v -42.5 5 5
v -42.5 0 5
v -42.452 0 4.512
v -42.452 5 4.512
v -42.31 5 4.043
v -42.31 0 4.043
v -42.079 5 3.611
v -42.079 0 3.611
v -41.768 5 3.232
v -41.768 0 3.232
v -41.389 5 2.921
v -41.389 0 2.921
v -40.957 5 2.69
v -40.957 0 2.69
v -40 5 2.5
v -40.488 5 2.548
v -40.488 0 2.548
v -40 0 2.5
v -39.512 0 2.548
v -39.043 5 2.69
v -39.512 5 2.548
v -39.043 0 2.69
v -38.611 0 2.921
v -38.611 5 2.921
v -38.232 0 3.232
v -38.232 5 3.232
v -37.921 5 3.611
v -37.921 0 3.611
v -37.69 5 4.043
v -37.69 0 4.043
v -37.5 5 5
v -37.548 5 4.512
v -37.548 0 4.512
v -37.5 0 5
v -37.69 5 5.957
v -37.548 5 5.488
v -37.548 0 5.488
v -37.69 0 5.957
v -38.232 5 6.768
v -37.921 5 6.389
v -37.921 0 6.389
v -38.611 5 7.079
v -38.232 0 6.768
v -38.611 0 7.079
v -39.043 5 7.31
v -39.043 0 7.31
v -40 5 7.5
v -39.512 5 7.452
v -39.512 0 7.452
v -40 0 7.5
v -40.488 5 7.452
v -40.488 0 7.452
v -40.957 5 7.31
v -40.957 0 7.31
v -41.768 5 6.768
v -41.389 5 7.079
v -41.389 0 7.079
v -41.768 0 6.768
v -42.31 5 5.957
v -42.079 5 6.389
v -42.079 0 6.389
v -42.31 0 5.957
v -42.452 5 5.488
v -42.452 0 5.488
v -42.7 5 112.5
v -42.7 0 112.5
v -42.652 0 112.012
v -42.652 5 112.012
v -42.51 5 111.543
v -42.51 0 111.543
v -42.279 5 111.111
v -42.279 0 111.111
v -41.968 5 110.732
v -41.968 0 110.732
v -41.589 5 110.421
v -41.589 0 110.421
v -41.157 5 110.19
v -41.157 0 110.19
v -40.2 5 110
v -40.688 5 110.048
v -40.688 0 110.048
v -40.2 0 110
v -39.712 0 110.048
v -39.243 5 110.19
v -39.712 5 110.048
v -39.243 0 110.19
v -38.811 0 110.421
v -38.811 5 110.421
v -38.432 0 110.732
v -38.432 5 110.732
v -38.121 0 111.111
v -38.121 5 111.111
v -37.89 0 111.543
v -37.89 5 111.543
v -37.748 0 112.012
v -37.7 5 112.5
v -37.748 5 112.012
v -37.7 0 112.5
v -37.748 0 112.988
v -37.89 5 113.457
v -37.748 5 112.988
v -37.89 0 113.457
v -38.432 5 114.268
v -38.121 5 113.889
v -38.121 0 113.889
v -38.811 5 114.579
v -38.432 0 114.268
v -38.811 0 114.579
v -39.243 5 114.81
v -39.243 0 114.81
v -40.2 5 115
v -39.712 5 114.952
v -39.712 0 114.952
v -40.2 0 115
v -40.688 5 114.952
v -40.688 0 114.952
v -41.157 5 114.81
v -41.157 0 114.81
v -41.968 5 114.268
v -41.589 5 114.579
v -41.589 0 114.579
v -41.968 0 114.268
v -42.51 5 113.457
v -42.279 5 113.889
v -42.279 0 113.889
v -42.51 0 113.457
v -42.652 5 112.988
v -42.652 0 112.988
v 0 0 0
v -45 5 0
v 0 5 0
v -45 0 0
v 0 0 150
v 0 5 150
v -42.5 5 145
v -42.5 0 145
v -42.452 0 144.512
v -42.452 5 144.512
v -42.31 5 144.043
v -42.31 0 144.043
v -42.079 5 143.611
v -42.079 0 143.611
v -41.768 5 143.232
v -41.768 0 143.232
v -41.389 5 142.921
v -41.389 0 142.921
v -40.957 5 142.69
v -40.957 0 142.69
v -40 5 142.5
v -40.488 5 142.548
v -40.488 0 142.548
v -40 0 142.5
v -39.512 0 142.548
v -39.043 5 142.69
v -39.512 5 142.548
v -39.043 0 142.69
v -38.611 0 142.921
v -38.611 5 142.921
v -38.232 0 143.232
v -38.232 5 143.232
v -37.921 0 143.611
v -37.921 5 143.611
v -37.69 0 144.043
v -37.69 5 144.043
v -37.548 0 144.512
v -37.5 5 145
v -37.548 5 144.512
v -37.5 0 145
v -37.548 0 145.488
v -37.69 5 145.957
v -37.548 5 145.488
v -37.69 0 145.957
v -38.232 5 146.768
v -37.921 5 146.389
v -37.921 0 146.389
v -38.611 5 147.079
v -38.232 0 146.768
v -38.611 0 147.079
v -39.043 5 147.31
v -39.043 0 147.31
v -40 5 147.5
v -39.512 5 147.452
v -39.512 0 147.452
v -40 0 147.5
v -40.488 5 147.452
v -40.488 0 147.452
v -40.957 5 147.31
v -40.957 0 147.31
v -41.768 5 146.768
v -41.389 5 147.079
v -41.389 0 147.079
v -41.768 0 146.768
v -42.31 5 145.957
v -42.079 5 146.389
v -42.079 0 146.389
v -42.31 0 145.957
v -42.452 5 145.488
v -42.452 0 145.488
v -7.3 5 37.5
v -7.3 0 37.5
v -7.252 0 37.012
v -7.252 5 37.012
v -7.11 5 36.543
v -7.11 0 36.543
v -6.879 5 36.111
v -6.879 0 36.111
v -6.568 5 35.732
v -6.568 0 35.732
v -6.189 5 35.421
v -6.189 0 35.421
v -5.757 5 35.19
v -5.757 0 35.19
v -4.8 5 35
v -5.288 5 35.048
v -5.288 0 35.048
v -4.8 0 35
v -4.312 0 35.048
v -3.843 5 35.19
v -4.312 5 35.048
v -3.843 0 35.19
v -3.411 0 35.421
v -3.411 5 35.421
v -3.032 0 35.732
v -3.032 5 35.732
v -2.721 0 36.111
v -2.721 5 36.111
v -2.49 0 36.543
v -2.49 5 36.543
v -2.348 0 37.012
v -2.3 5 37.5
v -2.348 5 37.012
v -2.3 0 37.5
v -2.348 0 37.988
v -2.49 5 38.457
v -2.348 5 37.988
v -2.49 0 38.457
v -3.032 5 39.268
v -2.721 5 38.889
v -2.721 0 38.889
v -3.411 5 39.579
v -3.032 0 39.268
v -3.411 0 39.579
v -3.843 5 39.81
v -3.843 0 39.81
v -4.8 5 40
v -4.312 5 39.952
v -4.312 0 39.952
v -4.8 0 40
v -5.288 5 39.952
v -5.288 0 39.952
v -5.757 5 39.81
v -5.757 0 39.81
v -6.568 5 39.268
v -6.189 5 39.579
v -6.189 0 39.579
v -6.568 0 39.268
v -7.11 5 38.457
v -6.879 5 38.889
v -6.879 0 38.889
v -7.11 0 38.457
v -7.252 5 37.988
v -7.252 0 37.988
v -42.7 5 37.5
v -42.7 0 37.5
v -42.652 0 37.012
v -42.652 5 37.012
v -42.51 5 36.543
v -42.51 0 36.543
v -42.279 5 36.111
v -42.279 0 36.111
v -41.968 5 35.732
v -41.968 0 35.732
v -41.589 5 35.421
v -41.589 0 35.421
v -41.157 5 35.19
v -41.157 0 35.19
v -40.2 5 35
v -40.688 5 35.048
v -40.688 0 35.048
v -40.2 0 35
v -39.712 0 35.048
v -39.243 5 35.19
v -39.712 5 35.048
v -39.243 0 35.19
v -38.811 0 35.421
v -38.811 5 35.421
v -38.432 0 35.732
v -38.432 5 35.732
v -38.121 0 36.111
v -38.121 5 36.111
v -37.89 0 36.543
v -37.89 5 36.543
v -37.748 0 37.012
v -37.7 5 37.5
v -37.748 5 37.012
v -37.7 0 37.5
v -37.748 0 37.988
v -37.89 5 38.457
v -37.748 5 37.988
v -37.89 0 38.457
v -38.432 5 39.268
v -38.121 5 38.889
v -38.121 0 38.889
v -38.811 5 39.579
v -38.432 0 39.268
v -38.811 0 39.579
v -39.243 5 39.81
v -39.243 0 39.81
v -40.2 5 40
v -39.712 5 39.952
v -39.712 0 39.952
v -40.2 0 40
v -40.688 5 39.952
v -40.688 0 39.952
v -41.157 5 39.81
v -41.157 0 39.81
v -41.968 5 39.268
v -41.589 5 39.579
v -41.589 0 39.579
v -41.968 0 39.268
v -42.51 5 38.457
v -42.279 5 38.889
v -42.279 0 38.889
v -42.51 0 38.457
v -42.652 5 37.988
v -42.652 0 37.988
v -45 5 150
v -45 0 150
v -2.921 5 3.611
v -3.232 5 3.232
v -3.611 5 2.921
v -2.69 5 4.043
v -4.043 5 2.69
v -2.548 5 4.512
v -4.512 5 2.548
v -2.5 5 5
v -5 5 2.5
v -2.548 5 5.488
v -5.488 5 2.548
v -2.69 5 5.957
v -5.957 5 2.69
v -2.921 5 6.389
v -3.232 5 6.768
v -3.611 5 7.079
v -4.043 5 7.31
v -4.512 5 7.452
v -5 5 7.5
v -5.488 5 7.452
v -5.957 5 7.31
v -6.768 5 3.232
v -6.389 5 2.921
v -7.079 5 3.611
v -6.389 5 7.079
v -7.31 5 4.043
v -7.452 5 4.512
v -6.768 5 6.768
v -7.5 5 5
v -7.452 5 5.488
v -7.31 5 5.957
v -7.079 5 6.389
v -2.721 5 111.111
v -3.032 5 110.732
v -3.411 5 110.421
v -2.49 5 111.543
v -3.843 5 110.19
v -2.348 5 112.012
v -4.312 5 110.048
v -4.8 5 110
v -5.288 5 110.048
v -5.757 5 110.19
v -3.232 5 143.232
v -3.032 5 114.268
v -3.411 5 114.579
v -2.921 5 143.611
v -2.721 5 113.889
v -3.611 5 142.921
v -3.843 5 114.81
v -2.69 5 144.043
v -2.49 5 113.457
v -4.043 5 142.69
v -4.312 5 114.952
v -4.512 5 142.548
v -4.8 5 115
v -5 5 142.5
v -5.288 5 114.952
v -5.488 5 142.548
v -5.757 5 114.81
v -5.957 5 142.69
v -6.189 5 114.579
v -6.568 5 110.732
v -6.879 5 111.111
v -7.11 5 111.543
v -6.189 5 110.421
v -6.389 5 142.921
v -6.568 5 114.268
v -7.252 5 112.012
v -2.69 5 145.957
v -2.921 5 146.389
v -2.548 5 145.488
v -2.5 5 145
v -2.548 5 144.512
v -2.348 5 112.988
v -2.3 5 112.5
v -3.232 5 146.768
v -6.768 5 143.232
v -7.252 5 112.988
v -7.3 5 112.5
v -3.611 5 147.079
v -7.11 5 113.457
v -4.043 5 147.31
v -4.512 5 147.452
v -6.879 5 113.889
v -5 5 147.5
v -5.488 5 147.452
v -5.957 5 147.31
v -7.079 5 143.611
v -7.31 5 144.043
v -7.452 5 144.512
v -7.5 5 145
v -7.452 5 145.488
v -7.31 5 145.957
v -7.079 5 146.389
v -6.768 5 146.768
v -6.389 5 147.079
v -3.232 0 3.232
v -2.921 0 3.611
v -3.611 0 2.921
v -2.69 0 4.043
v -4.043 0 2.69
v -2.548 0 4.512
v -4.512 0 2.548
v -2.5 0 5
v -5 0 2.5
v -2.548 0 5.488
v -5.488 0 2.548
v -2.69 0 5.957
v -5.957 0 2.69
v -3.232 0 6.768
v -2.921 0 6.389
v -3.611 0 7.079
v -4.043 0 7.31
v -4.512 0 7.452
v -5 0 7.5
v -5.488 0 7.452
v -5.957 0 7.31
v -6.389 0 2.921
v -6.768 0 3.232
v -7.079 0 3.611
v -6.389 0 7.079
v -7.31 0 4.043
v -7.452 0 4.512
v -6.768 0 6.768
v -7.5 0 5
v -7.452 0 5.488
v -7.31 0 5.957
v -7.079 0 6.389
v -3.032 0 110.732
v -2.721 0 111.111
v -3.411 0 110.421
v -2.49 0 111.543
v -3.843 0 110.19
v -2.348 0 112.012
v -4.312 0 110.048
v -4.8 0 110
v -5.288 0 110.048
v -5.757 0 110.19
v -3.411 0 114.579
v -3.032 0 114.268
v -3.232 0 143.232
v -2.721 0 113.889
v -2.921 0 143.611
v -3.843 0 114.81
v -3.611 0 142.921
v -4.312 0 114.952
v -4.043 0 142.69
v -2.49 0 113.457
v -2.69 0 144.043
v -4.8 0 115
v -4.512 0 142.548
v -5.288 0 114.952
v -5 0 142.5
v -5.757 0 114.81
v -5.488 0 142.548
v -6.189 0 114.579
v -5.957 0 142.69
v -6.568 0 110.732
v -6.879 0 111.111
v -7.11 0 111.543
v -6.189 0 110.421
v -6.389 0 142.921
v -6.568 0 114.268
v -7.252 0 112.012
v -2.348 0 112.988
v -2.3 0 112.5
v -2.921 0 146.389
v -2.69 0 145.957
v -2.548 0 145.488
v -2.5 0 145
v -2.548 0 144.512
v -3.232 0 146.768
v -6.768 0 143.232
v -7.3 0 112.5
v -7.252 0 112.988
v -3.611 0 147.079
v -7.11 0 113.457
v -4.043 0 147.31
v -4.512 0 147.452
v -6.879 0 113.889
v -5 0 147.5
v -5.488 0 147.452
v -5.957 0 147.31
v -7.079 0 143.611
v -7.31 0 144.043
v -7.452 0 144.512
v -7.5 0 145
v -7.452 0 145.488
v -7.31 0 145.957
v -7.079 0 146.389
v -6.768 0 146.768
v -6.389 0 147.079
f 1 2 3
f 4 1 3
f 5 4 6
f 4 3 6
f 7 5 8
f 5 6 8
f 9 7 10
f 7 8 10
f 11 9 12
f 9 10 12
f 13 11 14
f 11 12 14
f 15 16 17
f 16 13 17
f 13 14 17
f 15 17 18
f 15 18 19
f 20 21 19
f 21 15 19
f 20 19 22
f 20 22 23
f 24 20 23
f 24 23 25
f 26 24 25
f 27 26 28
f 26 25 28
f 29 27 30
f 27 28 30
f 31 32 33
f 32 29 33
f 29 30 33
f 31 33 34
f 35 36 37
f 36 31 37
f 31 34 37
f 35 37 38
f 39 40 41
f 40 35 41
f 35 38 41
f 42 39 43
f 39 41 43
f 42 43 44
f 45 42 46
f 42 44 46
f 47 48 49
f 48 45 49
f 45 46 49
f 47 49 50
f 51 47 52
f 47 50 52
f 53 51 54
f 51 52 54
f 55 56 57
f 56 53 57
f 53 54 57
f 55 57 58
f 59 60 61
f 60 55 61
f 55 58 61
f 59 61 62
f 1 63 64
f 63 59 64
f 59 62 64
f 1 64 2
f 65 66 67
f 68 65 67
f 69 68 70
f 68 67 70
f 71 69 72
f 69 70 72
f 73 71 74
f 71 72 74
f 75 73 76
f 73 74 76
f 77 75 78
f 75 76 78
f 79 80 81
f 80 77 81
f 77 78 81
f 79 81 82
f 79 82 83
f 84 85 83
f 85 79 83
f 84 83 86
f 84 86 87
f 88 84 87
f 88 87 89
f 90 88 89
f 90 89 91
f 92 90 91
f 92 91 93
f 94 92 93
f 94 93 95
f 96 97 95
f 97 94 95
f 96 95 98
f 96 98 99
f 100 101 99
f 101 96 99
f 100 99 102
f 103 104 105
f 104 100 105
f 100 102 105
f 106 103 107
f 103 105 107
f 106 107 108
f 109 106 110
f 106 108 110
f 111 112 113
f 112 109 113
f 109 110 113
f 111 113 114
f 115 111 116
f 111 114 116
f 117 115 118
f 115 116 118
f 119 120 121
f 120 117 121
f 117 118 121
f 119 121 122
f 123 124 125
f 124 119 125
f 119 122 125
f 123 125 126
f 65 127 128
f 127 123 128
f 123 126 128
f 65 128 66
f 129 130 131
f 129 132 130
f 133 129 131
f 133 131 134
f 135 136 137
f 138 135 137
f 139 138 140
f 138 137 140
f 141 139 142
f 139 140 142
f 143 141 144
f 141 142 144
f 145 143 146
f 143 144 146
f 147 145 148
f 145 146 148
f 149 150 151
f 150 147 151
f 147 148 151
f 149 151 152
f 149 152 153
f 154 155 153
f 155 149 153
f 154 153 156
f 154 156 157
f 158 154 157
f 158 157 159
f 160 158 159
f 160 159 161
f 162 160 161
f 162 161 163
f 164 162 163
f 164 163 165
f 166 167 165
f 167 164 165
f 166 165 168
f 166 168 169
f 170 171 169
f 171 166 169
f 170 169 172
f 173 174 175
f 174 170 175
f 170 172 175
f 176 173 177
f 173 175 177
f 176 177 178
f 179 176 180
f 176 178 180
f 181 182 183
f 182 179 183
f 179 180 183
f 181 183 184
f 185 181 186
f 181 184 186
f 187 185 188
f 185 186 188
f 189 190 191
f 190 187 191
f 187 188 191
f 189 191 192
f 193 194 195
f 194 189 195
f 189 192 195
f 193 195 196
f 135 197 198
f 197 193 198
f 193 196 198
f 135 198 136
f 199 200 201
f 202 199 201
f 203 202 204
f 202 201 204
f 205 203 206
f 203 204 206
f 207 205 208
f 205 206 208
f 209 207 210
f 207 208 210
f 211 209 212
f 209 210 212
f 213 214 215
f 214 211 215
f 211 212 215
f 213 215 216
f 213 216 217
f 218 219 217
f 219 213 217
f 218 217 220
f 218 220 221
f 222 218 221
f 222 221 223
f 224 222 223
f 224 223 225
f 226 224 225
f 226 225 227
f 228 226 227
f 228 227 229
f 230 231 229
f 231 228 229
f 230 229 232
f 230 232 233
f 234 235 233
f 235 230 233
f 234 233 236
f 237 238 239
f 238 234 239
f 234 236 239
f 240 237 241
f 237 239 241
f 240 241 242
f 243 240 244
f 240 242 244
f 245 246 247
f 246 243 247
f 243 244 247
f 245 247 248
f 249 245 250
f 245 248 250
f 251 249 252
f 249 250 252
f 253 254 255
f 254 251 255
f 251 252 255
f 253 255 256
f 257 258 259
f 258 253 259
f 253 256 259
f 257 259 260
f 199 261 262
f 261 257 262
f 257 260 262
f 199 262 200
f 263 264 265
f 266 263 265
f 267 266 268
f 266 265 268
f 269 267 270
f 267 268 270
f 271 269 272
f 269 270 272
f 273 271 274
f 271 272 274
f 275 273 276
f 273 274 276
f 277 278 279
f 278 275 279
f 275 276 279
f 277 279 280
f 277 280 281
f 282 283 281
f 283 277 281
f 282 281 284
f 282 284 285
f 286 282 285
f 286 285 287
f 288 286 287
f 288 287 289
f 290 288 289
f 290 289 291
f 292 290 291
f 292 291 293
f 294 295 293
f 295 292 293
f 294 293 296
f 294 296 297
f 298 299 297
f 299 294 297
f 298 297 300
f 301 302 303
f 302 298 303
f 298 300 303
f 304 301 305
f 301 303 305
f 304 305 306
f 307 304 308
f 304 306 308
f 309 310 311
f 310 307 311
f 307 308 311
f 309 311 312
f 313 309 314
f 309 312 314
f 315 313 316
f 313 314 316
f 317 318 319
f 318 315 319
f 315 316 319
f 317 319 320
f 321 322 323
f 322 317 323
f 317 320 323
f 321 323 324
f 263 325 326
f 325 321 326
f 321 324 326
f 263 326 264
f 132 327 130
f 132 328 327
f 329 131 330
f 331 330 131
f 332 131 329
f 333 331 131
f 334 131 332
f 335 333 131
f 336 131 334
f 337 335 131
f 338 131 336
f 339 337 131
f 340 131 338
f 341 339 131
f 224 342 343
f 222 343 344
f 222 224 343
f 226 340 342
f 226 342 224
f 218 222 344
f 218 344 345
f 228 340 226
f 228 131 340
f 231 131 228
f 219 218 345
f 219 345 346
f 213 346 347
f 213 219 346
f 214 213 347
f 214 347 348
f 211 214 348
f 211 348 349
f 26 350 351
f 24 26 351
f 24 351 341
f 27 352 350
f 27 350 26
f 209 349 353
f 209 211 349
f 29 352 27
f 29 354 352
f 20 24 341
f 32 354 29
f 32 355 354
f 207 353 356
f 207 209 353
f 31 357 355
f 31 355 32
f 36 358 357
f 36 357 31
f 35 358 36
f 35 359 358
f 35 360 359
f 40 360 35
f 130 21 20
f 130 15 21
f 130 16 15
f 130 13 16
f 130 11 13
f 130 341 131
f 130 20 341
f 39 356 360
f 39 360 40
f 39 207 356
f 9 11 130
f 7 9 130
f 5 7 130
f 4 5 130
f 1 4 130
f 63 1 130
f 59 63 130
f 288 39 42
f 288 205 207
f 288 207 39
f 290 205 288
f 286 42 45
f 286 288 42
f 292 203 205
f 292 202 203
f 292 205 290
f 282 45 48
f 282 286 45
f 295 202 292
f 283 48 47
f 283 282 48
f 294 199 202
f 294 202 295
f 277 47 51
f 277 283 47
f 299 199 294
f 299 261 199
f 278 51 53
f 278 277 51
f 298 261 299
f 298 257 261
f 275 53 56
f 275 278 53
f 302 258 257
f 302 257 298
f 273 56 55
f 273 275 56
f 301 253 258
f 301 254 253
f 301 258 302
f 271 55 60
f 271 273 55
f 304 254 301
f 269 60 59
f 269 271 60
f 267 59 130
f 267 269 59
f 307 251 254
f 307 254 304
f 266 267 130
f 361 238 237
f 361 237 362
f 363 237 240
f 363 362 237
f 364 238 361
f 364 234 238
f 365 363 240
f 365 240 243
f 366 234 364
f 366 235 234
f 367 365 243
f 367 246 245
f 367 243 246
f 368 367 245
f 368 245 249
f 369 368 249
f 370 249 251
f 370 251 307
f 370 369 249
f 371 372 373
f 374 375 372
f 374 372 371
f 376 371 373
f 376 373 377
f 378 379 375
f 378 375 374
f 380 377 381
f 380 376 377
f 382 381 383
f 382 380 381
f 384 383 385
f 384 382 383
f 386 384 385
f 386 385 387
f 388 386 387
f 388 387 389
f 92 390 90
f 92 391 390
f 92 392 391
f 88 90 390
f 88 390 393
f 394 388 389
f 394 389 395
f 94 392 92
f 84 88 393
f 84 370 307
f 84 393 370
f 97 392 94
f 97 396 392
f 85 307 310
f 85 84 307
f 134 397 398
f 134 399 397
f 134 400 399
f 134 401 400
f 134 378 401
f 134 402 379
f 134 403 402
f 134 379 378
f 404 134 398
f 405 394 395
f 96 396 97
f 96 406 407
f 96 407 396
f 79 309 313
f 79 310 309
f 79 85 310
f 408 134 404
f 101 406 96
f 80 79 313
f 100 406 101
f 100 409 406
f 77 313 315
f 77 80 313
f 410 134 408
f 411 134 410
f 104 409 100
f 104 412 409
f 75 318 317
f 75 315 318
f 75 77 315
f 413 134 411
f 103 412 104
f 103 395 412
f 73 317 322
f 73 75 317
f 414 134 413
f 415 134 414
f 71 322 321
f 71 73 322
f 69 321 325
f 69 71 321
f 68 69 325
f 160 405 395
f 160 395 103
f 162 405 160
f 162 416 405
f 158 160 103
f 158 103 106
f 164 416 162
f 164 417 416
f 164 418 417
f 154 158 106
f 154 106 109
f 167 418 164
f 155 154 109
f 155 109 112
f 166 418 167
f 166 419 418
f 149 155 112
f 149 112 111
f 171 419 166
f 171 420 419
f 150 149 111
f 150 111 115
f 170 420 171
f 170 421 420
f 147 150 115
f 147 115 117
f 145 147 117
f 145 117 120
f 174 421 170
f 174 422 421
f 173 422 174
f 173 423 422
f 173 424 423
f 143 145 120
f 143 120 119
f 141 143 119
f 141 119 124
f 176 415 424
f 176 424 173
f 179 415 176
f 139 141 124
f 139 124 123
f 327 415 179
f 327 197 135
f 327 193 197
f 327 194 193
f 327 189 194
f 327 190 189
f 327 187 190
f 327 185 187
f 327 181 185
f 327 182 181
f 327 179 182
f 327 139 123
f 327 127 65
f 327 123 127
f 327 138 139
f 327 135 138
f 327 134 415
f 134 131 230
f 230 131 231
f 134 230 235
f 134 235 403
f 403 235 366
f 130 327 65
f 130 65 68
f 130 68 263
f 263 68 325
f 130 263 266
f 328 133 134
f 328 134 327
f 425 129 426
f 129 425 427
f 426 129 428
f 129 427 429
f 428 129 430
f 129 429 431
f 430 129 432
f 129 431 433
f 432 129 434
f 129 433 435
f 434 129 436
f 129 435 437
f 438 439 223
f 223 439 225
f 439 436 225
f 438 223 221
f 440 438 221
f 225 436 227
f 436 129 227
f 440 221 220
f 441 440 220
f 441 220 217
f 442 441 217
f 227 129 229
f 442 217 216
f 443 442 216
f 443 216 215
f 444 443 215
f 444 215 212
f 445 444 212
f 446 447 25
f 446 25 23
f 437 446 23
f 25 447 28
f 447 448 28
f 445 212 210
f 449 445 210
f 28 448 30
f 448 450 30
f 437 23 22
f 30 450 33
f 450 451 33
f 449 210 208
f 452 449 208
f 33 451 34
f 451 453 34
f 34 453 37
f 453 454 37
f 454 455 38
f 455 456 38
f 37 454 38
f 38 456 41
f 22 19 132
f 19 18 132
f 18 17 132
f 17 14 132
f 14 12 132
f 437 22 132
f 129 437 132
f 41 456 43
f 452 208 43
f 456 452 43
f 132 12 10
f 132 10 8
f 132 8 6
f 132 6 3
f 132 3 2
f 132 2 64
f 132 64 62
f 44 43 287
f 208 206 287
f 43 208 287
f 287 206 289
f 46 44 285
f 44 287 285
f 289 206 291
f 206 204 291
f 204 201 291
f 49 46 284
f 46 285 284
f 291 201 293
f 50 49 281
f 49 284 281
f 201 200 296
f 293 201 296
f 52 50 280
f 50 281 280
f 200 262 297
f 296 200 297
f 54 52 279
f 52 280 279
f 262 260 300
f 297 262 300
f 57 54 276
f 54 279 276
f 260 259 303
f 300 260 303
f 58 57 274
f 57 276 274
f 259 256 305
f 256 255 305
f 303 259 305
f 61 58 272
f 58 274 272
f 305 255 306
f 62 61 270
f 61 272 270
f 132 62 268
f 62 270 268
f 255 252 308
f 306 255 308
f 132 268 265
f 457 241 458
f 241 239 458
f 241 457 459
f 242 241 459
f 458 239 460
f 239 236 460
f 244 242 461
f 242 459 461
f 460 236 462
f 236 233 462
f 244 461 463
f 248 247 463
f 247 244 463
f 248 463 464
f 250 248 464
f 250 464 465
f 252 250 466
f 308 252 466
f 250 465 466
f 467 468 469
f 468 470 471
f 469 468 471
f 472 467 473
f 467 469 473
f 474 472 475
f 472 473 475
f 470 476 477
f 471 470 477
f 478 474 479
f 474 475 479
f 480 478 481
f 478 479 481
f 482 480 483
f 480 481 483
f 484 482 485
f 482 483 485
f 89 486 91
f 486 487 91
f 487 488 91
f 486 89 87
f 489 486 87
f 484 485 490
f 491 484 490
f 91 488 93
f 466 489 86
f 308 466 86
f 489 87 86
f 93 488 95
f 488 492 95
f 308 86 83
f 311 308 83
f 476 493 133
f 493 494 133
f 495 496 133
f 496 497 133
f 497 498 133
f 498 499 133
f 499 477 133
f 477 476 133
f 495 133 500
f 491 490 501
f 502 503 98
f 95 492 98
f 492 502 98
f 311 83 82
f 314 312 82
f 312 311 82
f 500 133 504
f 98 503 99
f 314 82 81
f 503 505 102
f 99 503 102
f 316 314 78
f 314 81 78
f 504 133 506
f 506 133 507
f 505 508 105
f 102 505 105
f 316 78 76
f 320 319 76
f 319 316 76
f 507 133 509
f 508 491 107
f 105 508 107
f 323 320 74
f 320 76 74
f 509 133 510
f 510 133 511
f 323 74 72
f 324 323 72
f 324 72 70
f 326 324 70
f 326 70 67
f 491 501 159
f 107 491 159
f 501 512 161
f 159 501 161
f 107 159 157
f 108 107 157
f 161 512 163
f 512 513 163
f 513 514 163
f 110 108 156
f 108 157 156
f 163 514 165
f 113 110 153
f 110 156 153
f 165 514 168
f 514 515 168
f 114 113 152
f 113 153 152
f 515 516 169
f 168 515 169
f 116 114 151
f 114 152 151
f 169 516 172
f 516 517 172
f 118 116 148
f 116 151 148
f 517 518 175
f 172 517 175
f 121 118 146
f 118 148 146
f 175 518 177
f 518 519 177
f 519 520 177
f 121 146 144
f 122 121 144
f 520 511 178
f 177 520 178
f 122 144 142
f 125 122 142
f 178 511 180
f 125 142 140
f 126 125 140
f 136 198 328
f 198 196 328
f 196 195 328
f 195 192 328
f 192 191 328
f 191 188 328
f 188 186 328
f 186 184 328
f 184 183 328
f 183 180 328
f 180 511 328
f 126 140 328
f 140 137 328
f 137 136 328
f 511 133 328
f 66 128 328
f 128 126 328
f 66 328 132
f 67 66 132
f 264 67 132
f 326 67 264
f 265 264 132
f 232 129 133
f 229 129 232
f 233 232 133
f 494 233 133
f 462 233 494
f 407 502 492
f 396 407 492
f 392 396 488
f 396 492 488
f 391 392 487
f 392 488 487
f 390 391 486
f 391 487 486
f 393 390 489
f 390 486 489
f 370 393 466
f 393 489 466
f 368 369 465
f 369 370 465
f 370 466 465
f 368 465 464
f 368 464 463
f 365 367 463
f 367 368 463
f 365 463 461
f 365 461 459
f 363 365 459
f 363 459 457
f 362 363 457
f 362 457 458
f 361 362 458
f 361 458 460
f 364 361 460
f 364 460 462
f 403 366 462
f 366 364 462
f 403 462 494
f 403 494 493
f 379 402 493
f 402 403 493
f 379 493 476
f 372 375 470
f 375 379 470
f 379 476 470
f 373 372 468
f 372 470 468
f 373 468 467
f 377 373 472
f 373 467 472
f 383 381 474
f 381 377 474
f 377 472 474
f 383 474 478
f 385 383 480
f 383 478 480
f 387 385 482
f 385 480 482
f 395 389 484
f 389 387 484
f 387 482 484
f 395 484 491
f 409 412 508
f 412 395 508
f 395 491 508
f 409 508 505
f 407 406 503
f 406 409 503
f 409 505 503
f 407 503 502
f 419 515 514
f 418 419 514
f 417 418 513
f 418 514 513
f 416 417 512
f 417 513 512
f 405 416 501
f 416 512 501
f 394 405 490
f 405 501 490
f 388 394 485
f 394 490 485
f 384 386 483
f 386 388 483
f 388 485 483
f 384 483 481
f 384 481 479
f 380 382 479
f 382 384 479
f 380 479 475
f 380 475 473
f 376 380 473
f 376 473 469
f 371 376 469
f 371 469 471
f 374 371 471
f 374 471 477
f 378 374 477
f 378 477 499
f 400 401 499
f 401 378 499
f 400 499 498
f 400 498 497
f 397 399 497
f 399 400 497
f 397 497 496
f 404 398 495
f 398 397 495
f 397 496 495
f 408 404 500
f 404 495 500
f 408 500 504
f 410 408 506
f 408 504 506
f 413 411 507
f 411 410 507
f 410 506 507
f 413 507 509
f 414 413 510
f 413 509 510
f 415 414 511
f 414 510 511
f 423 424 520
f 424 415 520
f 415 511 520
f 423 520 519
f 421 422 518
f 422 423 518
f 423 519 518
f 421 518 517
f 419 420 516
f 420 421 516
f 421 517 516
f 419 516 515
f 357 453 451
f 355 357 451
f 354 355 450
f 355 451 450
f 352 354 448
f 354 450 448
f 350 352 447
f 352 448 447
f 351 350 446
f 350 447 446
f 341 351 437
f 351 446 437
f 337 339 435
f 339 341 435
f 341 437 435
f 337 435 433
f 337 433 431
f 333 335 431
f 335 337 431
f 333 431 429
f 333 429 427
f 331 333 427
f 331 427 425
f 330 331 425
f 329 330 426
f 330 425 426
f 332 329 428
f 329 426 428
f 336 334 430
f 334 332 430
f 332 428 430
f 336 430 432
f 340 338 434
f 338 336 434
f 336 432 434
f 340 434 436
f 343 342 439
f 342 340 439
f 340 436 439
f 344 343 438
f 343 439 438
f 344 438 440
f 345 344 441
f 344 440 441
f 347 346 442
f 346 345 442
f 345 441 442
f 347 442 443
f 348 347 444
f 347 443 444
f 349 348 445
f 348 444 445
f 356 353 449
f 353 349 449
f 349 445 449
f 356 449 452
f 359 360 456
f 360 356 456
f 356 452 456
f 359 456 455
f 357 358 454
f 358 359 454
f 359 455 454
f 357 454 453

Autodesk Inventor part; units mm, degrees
ref_plane "YZ Plane" through (0, 0, 0) normal (1, 0, 0) x (0, 1, 0)
ref_plane "XZ Plane" through (0, 0, 0) normal (0, 1, 0) x (-1, 0, 0)
ref_plane "XY Plane" through (0, 0, 0) normal (0, 0, 1) x (1, 0, 0)
sketch "Esboço1" plane through (0, 0, 0) normal (0, 1, 0) x (-1, 0, 0)
  line L0 (0, 0) -> (0, 150)
  line L1 (0, 150) -> (45, 150)
  line L2 (45, 150) -> (45, 0)
  line L3 (45, 0) -> (0, 0)
  line L4 (45, 0) -> (55, 0)
  circle A0 centre (5, 5) radius 2.5
  circle A1 centre (5, 145) radius 2.5
  circle A2 centre (40, 145) radius 2.5
  circle A3 centre (40, 5) radius 2.5
  circle A4 centre (40.2, 112.5) radius 2.5
  circle A5 centre (4.8, 112.5) radius 2.5
  circle A6 centre (40.2, 37.5) radius 2.5
  circle A7 centre (4.8, 37.5) radius 2.5
  dimension "d0" = 150
  dimension "d1" = 45
  dimension "d10" = 5
  dimension "d12" = 5
  dimension "d22" = 5
  dimension "d23" = 5
  dimension "d35" = 5
  dimension "d36" = 5
  dimension "d37" = 5
  dimension "d38" = 5
extrude "Extrusão6" add sketch "Esboço1" along normal blind 5
properties part number "BaseM"
